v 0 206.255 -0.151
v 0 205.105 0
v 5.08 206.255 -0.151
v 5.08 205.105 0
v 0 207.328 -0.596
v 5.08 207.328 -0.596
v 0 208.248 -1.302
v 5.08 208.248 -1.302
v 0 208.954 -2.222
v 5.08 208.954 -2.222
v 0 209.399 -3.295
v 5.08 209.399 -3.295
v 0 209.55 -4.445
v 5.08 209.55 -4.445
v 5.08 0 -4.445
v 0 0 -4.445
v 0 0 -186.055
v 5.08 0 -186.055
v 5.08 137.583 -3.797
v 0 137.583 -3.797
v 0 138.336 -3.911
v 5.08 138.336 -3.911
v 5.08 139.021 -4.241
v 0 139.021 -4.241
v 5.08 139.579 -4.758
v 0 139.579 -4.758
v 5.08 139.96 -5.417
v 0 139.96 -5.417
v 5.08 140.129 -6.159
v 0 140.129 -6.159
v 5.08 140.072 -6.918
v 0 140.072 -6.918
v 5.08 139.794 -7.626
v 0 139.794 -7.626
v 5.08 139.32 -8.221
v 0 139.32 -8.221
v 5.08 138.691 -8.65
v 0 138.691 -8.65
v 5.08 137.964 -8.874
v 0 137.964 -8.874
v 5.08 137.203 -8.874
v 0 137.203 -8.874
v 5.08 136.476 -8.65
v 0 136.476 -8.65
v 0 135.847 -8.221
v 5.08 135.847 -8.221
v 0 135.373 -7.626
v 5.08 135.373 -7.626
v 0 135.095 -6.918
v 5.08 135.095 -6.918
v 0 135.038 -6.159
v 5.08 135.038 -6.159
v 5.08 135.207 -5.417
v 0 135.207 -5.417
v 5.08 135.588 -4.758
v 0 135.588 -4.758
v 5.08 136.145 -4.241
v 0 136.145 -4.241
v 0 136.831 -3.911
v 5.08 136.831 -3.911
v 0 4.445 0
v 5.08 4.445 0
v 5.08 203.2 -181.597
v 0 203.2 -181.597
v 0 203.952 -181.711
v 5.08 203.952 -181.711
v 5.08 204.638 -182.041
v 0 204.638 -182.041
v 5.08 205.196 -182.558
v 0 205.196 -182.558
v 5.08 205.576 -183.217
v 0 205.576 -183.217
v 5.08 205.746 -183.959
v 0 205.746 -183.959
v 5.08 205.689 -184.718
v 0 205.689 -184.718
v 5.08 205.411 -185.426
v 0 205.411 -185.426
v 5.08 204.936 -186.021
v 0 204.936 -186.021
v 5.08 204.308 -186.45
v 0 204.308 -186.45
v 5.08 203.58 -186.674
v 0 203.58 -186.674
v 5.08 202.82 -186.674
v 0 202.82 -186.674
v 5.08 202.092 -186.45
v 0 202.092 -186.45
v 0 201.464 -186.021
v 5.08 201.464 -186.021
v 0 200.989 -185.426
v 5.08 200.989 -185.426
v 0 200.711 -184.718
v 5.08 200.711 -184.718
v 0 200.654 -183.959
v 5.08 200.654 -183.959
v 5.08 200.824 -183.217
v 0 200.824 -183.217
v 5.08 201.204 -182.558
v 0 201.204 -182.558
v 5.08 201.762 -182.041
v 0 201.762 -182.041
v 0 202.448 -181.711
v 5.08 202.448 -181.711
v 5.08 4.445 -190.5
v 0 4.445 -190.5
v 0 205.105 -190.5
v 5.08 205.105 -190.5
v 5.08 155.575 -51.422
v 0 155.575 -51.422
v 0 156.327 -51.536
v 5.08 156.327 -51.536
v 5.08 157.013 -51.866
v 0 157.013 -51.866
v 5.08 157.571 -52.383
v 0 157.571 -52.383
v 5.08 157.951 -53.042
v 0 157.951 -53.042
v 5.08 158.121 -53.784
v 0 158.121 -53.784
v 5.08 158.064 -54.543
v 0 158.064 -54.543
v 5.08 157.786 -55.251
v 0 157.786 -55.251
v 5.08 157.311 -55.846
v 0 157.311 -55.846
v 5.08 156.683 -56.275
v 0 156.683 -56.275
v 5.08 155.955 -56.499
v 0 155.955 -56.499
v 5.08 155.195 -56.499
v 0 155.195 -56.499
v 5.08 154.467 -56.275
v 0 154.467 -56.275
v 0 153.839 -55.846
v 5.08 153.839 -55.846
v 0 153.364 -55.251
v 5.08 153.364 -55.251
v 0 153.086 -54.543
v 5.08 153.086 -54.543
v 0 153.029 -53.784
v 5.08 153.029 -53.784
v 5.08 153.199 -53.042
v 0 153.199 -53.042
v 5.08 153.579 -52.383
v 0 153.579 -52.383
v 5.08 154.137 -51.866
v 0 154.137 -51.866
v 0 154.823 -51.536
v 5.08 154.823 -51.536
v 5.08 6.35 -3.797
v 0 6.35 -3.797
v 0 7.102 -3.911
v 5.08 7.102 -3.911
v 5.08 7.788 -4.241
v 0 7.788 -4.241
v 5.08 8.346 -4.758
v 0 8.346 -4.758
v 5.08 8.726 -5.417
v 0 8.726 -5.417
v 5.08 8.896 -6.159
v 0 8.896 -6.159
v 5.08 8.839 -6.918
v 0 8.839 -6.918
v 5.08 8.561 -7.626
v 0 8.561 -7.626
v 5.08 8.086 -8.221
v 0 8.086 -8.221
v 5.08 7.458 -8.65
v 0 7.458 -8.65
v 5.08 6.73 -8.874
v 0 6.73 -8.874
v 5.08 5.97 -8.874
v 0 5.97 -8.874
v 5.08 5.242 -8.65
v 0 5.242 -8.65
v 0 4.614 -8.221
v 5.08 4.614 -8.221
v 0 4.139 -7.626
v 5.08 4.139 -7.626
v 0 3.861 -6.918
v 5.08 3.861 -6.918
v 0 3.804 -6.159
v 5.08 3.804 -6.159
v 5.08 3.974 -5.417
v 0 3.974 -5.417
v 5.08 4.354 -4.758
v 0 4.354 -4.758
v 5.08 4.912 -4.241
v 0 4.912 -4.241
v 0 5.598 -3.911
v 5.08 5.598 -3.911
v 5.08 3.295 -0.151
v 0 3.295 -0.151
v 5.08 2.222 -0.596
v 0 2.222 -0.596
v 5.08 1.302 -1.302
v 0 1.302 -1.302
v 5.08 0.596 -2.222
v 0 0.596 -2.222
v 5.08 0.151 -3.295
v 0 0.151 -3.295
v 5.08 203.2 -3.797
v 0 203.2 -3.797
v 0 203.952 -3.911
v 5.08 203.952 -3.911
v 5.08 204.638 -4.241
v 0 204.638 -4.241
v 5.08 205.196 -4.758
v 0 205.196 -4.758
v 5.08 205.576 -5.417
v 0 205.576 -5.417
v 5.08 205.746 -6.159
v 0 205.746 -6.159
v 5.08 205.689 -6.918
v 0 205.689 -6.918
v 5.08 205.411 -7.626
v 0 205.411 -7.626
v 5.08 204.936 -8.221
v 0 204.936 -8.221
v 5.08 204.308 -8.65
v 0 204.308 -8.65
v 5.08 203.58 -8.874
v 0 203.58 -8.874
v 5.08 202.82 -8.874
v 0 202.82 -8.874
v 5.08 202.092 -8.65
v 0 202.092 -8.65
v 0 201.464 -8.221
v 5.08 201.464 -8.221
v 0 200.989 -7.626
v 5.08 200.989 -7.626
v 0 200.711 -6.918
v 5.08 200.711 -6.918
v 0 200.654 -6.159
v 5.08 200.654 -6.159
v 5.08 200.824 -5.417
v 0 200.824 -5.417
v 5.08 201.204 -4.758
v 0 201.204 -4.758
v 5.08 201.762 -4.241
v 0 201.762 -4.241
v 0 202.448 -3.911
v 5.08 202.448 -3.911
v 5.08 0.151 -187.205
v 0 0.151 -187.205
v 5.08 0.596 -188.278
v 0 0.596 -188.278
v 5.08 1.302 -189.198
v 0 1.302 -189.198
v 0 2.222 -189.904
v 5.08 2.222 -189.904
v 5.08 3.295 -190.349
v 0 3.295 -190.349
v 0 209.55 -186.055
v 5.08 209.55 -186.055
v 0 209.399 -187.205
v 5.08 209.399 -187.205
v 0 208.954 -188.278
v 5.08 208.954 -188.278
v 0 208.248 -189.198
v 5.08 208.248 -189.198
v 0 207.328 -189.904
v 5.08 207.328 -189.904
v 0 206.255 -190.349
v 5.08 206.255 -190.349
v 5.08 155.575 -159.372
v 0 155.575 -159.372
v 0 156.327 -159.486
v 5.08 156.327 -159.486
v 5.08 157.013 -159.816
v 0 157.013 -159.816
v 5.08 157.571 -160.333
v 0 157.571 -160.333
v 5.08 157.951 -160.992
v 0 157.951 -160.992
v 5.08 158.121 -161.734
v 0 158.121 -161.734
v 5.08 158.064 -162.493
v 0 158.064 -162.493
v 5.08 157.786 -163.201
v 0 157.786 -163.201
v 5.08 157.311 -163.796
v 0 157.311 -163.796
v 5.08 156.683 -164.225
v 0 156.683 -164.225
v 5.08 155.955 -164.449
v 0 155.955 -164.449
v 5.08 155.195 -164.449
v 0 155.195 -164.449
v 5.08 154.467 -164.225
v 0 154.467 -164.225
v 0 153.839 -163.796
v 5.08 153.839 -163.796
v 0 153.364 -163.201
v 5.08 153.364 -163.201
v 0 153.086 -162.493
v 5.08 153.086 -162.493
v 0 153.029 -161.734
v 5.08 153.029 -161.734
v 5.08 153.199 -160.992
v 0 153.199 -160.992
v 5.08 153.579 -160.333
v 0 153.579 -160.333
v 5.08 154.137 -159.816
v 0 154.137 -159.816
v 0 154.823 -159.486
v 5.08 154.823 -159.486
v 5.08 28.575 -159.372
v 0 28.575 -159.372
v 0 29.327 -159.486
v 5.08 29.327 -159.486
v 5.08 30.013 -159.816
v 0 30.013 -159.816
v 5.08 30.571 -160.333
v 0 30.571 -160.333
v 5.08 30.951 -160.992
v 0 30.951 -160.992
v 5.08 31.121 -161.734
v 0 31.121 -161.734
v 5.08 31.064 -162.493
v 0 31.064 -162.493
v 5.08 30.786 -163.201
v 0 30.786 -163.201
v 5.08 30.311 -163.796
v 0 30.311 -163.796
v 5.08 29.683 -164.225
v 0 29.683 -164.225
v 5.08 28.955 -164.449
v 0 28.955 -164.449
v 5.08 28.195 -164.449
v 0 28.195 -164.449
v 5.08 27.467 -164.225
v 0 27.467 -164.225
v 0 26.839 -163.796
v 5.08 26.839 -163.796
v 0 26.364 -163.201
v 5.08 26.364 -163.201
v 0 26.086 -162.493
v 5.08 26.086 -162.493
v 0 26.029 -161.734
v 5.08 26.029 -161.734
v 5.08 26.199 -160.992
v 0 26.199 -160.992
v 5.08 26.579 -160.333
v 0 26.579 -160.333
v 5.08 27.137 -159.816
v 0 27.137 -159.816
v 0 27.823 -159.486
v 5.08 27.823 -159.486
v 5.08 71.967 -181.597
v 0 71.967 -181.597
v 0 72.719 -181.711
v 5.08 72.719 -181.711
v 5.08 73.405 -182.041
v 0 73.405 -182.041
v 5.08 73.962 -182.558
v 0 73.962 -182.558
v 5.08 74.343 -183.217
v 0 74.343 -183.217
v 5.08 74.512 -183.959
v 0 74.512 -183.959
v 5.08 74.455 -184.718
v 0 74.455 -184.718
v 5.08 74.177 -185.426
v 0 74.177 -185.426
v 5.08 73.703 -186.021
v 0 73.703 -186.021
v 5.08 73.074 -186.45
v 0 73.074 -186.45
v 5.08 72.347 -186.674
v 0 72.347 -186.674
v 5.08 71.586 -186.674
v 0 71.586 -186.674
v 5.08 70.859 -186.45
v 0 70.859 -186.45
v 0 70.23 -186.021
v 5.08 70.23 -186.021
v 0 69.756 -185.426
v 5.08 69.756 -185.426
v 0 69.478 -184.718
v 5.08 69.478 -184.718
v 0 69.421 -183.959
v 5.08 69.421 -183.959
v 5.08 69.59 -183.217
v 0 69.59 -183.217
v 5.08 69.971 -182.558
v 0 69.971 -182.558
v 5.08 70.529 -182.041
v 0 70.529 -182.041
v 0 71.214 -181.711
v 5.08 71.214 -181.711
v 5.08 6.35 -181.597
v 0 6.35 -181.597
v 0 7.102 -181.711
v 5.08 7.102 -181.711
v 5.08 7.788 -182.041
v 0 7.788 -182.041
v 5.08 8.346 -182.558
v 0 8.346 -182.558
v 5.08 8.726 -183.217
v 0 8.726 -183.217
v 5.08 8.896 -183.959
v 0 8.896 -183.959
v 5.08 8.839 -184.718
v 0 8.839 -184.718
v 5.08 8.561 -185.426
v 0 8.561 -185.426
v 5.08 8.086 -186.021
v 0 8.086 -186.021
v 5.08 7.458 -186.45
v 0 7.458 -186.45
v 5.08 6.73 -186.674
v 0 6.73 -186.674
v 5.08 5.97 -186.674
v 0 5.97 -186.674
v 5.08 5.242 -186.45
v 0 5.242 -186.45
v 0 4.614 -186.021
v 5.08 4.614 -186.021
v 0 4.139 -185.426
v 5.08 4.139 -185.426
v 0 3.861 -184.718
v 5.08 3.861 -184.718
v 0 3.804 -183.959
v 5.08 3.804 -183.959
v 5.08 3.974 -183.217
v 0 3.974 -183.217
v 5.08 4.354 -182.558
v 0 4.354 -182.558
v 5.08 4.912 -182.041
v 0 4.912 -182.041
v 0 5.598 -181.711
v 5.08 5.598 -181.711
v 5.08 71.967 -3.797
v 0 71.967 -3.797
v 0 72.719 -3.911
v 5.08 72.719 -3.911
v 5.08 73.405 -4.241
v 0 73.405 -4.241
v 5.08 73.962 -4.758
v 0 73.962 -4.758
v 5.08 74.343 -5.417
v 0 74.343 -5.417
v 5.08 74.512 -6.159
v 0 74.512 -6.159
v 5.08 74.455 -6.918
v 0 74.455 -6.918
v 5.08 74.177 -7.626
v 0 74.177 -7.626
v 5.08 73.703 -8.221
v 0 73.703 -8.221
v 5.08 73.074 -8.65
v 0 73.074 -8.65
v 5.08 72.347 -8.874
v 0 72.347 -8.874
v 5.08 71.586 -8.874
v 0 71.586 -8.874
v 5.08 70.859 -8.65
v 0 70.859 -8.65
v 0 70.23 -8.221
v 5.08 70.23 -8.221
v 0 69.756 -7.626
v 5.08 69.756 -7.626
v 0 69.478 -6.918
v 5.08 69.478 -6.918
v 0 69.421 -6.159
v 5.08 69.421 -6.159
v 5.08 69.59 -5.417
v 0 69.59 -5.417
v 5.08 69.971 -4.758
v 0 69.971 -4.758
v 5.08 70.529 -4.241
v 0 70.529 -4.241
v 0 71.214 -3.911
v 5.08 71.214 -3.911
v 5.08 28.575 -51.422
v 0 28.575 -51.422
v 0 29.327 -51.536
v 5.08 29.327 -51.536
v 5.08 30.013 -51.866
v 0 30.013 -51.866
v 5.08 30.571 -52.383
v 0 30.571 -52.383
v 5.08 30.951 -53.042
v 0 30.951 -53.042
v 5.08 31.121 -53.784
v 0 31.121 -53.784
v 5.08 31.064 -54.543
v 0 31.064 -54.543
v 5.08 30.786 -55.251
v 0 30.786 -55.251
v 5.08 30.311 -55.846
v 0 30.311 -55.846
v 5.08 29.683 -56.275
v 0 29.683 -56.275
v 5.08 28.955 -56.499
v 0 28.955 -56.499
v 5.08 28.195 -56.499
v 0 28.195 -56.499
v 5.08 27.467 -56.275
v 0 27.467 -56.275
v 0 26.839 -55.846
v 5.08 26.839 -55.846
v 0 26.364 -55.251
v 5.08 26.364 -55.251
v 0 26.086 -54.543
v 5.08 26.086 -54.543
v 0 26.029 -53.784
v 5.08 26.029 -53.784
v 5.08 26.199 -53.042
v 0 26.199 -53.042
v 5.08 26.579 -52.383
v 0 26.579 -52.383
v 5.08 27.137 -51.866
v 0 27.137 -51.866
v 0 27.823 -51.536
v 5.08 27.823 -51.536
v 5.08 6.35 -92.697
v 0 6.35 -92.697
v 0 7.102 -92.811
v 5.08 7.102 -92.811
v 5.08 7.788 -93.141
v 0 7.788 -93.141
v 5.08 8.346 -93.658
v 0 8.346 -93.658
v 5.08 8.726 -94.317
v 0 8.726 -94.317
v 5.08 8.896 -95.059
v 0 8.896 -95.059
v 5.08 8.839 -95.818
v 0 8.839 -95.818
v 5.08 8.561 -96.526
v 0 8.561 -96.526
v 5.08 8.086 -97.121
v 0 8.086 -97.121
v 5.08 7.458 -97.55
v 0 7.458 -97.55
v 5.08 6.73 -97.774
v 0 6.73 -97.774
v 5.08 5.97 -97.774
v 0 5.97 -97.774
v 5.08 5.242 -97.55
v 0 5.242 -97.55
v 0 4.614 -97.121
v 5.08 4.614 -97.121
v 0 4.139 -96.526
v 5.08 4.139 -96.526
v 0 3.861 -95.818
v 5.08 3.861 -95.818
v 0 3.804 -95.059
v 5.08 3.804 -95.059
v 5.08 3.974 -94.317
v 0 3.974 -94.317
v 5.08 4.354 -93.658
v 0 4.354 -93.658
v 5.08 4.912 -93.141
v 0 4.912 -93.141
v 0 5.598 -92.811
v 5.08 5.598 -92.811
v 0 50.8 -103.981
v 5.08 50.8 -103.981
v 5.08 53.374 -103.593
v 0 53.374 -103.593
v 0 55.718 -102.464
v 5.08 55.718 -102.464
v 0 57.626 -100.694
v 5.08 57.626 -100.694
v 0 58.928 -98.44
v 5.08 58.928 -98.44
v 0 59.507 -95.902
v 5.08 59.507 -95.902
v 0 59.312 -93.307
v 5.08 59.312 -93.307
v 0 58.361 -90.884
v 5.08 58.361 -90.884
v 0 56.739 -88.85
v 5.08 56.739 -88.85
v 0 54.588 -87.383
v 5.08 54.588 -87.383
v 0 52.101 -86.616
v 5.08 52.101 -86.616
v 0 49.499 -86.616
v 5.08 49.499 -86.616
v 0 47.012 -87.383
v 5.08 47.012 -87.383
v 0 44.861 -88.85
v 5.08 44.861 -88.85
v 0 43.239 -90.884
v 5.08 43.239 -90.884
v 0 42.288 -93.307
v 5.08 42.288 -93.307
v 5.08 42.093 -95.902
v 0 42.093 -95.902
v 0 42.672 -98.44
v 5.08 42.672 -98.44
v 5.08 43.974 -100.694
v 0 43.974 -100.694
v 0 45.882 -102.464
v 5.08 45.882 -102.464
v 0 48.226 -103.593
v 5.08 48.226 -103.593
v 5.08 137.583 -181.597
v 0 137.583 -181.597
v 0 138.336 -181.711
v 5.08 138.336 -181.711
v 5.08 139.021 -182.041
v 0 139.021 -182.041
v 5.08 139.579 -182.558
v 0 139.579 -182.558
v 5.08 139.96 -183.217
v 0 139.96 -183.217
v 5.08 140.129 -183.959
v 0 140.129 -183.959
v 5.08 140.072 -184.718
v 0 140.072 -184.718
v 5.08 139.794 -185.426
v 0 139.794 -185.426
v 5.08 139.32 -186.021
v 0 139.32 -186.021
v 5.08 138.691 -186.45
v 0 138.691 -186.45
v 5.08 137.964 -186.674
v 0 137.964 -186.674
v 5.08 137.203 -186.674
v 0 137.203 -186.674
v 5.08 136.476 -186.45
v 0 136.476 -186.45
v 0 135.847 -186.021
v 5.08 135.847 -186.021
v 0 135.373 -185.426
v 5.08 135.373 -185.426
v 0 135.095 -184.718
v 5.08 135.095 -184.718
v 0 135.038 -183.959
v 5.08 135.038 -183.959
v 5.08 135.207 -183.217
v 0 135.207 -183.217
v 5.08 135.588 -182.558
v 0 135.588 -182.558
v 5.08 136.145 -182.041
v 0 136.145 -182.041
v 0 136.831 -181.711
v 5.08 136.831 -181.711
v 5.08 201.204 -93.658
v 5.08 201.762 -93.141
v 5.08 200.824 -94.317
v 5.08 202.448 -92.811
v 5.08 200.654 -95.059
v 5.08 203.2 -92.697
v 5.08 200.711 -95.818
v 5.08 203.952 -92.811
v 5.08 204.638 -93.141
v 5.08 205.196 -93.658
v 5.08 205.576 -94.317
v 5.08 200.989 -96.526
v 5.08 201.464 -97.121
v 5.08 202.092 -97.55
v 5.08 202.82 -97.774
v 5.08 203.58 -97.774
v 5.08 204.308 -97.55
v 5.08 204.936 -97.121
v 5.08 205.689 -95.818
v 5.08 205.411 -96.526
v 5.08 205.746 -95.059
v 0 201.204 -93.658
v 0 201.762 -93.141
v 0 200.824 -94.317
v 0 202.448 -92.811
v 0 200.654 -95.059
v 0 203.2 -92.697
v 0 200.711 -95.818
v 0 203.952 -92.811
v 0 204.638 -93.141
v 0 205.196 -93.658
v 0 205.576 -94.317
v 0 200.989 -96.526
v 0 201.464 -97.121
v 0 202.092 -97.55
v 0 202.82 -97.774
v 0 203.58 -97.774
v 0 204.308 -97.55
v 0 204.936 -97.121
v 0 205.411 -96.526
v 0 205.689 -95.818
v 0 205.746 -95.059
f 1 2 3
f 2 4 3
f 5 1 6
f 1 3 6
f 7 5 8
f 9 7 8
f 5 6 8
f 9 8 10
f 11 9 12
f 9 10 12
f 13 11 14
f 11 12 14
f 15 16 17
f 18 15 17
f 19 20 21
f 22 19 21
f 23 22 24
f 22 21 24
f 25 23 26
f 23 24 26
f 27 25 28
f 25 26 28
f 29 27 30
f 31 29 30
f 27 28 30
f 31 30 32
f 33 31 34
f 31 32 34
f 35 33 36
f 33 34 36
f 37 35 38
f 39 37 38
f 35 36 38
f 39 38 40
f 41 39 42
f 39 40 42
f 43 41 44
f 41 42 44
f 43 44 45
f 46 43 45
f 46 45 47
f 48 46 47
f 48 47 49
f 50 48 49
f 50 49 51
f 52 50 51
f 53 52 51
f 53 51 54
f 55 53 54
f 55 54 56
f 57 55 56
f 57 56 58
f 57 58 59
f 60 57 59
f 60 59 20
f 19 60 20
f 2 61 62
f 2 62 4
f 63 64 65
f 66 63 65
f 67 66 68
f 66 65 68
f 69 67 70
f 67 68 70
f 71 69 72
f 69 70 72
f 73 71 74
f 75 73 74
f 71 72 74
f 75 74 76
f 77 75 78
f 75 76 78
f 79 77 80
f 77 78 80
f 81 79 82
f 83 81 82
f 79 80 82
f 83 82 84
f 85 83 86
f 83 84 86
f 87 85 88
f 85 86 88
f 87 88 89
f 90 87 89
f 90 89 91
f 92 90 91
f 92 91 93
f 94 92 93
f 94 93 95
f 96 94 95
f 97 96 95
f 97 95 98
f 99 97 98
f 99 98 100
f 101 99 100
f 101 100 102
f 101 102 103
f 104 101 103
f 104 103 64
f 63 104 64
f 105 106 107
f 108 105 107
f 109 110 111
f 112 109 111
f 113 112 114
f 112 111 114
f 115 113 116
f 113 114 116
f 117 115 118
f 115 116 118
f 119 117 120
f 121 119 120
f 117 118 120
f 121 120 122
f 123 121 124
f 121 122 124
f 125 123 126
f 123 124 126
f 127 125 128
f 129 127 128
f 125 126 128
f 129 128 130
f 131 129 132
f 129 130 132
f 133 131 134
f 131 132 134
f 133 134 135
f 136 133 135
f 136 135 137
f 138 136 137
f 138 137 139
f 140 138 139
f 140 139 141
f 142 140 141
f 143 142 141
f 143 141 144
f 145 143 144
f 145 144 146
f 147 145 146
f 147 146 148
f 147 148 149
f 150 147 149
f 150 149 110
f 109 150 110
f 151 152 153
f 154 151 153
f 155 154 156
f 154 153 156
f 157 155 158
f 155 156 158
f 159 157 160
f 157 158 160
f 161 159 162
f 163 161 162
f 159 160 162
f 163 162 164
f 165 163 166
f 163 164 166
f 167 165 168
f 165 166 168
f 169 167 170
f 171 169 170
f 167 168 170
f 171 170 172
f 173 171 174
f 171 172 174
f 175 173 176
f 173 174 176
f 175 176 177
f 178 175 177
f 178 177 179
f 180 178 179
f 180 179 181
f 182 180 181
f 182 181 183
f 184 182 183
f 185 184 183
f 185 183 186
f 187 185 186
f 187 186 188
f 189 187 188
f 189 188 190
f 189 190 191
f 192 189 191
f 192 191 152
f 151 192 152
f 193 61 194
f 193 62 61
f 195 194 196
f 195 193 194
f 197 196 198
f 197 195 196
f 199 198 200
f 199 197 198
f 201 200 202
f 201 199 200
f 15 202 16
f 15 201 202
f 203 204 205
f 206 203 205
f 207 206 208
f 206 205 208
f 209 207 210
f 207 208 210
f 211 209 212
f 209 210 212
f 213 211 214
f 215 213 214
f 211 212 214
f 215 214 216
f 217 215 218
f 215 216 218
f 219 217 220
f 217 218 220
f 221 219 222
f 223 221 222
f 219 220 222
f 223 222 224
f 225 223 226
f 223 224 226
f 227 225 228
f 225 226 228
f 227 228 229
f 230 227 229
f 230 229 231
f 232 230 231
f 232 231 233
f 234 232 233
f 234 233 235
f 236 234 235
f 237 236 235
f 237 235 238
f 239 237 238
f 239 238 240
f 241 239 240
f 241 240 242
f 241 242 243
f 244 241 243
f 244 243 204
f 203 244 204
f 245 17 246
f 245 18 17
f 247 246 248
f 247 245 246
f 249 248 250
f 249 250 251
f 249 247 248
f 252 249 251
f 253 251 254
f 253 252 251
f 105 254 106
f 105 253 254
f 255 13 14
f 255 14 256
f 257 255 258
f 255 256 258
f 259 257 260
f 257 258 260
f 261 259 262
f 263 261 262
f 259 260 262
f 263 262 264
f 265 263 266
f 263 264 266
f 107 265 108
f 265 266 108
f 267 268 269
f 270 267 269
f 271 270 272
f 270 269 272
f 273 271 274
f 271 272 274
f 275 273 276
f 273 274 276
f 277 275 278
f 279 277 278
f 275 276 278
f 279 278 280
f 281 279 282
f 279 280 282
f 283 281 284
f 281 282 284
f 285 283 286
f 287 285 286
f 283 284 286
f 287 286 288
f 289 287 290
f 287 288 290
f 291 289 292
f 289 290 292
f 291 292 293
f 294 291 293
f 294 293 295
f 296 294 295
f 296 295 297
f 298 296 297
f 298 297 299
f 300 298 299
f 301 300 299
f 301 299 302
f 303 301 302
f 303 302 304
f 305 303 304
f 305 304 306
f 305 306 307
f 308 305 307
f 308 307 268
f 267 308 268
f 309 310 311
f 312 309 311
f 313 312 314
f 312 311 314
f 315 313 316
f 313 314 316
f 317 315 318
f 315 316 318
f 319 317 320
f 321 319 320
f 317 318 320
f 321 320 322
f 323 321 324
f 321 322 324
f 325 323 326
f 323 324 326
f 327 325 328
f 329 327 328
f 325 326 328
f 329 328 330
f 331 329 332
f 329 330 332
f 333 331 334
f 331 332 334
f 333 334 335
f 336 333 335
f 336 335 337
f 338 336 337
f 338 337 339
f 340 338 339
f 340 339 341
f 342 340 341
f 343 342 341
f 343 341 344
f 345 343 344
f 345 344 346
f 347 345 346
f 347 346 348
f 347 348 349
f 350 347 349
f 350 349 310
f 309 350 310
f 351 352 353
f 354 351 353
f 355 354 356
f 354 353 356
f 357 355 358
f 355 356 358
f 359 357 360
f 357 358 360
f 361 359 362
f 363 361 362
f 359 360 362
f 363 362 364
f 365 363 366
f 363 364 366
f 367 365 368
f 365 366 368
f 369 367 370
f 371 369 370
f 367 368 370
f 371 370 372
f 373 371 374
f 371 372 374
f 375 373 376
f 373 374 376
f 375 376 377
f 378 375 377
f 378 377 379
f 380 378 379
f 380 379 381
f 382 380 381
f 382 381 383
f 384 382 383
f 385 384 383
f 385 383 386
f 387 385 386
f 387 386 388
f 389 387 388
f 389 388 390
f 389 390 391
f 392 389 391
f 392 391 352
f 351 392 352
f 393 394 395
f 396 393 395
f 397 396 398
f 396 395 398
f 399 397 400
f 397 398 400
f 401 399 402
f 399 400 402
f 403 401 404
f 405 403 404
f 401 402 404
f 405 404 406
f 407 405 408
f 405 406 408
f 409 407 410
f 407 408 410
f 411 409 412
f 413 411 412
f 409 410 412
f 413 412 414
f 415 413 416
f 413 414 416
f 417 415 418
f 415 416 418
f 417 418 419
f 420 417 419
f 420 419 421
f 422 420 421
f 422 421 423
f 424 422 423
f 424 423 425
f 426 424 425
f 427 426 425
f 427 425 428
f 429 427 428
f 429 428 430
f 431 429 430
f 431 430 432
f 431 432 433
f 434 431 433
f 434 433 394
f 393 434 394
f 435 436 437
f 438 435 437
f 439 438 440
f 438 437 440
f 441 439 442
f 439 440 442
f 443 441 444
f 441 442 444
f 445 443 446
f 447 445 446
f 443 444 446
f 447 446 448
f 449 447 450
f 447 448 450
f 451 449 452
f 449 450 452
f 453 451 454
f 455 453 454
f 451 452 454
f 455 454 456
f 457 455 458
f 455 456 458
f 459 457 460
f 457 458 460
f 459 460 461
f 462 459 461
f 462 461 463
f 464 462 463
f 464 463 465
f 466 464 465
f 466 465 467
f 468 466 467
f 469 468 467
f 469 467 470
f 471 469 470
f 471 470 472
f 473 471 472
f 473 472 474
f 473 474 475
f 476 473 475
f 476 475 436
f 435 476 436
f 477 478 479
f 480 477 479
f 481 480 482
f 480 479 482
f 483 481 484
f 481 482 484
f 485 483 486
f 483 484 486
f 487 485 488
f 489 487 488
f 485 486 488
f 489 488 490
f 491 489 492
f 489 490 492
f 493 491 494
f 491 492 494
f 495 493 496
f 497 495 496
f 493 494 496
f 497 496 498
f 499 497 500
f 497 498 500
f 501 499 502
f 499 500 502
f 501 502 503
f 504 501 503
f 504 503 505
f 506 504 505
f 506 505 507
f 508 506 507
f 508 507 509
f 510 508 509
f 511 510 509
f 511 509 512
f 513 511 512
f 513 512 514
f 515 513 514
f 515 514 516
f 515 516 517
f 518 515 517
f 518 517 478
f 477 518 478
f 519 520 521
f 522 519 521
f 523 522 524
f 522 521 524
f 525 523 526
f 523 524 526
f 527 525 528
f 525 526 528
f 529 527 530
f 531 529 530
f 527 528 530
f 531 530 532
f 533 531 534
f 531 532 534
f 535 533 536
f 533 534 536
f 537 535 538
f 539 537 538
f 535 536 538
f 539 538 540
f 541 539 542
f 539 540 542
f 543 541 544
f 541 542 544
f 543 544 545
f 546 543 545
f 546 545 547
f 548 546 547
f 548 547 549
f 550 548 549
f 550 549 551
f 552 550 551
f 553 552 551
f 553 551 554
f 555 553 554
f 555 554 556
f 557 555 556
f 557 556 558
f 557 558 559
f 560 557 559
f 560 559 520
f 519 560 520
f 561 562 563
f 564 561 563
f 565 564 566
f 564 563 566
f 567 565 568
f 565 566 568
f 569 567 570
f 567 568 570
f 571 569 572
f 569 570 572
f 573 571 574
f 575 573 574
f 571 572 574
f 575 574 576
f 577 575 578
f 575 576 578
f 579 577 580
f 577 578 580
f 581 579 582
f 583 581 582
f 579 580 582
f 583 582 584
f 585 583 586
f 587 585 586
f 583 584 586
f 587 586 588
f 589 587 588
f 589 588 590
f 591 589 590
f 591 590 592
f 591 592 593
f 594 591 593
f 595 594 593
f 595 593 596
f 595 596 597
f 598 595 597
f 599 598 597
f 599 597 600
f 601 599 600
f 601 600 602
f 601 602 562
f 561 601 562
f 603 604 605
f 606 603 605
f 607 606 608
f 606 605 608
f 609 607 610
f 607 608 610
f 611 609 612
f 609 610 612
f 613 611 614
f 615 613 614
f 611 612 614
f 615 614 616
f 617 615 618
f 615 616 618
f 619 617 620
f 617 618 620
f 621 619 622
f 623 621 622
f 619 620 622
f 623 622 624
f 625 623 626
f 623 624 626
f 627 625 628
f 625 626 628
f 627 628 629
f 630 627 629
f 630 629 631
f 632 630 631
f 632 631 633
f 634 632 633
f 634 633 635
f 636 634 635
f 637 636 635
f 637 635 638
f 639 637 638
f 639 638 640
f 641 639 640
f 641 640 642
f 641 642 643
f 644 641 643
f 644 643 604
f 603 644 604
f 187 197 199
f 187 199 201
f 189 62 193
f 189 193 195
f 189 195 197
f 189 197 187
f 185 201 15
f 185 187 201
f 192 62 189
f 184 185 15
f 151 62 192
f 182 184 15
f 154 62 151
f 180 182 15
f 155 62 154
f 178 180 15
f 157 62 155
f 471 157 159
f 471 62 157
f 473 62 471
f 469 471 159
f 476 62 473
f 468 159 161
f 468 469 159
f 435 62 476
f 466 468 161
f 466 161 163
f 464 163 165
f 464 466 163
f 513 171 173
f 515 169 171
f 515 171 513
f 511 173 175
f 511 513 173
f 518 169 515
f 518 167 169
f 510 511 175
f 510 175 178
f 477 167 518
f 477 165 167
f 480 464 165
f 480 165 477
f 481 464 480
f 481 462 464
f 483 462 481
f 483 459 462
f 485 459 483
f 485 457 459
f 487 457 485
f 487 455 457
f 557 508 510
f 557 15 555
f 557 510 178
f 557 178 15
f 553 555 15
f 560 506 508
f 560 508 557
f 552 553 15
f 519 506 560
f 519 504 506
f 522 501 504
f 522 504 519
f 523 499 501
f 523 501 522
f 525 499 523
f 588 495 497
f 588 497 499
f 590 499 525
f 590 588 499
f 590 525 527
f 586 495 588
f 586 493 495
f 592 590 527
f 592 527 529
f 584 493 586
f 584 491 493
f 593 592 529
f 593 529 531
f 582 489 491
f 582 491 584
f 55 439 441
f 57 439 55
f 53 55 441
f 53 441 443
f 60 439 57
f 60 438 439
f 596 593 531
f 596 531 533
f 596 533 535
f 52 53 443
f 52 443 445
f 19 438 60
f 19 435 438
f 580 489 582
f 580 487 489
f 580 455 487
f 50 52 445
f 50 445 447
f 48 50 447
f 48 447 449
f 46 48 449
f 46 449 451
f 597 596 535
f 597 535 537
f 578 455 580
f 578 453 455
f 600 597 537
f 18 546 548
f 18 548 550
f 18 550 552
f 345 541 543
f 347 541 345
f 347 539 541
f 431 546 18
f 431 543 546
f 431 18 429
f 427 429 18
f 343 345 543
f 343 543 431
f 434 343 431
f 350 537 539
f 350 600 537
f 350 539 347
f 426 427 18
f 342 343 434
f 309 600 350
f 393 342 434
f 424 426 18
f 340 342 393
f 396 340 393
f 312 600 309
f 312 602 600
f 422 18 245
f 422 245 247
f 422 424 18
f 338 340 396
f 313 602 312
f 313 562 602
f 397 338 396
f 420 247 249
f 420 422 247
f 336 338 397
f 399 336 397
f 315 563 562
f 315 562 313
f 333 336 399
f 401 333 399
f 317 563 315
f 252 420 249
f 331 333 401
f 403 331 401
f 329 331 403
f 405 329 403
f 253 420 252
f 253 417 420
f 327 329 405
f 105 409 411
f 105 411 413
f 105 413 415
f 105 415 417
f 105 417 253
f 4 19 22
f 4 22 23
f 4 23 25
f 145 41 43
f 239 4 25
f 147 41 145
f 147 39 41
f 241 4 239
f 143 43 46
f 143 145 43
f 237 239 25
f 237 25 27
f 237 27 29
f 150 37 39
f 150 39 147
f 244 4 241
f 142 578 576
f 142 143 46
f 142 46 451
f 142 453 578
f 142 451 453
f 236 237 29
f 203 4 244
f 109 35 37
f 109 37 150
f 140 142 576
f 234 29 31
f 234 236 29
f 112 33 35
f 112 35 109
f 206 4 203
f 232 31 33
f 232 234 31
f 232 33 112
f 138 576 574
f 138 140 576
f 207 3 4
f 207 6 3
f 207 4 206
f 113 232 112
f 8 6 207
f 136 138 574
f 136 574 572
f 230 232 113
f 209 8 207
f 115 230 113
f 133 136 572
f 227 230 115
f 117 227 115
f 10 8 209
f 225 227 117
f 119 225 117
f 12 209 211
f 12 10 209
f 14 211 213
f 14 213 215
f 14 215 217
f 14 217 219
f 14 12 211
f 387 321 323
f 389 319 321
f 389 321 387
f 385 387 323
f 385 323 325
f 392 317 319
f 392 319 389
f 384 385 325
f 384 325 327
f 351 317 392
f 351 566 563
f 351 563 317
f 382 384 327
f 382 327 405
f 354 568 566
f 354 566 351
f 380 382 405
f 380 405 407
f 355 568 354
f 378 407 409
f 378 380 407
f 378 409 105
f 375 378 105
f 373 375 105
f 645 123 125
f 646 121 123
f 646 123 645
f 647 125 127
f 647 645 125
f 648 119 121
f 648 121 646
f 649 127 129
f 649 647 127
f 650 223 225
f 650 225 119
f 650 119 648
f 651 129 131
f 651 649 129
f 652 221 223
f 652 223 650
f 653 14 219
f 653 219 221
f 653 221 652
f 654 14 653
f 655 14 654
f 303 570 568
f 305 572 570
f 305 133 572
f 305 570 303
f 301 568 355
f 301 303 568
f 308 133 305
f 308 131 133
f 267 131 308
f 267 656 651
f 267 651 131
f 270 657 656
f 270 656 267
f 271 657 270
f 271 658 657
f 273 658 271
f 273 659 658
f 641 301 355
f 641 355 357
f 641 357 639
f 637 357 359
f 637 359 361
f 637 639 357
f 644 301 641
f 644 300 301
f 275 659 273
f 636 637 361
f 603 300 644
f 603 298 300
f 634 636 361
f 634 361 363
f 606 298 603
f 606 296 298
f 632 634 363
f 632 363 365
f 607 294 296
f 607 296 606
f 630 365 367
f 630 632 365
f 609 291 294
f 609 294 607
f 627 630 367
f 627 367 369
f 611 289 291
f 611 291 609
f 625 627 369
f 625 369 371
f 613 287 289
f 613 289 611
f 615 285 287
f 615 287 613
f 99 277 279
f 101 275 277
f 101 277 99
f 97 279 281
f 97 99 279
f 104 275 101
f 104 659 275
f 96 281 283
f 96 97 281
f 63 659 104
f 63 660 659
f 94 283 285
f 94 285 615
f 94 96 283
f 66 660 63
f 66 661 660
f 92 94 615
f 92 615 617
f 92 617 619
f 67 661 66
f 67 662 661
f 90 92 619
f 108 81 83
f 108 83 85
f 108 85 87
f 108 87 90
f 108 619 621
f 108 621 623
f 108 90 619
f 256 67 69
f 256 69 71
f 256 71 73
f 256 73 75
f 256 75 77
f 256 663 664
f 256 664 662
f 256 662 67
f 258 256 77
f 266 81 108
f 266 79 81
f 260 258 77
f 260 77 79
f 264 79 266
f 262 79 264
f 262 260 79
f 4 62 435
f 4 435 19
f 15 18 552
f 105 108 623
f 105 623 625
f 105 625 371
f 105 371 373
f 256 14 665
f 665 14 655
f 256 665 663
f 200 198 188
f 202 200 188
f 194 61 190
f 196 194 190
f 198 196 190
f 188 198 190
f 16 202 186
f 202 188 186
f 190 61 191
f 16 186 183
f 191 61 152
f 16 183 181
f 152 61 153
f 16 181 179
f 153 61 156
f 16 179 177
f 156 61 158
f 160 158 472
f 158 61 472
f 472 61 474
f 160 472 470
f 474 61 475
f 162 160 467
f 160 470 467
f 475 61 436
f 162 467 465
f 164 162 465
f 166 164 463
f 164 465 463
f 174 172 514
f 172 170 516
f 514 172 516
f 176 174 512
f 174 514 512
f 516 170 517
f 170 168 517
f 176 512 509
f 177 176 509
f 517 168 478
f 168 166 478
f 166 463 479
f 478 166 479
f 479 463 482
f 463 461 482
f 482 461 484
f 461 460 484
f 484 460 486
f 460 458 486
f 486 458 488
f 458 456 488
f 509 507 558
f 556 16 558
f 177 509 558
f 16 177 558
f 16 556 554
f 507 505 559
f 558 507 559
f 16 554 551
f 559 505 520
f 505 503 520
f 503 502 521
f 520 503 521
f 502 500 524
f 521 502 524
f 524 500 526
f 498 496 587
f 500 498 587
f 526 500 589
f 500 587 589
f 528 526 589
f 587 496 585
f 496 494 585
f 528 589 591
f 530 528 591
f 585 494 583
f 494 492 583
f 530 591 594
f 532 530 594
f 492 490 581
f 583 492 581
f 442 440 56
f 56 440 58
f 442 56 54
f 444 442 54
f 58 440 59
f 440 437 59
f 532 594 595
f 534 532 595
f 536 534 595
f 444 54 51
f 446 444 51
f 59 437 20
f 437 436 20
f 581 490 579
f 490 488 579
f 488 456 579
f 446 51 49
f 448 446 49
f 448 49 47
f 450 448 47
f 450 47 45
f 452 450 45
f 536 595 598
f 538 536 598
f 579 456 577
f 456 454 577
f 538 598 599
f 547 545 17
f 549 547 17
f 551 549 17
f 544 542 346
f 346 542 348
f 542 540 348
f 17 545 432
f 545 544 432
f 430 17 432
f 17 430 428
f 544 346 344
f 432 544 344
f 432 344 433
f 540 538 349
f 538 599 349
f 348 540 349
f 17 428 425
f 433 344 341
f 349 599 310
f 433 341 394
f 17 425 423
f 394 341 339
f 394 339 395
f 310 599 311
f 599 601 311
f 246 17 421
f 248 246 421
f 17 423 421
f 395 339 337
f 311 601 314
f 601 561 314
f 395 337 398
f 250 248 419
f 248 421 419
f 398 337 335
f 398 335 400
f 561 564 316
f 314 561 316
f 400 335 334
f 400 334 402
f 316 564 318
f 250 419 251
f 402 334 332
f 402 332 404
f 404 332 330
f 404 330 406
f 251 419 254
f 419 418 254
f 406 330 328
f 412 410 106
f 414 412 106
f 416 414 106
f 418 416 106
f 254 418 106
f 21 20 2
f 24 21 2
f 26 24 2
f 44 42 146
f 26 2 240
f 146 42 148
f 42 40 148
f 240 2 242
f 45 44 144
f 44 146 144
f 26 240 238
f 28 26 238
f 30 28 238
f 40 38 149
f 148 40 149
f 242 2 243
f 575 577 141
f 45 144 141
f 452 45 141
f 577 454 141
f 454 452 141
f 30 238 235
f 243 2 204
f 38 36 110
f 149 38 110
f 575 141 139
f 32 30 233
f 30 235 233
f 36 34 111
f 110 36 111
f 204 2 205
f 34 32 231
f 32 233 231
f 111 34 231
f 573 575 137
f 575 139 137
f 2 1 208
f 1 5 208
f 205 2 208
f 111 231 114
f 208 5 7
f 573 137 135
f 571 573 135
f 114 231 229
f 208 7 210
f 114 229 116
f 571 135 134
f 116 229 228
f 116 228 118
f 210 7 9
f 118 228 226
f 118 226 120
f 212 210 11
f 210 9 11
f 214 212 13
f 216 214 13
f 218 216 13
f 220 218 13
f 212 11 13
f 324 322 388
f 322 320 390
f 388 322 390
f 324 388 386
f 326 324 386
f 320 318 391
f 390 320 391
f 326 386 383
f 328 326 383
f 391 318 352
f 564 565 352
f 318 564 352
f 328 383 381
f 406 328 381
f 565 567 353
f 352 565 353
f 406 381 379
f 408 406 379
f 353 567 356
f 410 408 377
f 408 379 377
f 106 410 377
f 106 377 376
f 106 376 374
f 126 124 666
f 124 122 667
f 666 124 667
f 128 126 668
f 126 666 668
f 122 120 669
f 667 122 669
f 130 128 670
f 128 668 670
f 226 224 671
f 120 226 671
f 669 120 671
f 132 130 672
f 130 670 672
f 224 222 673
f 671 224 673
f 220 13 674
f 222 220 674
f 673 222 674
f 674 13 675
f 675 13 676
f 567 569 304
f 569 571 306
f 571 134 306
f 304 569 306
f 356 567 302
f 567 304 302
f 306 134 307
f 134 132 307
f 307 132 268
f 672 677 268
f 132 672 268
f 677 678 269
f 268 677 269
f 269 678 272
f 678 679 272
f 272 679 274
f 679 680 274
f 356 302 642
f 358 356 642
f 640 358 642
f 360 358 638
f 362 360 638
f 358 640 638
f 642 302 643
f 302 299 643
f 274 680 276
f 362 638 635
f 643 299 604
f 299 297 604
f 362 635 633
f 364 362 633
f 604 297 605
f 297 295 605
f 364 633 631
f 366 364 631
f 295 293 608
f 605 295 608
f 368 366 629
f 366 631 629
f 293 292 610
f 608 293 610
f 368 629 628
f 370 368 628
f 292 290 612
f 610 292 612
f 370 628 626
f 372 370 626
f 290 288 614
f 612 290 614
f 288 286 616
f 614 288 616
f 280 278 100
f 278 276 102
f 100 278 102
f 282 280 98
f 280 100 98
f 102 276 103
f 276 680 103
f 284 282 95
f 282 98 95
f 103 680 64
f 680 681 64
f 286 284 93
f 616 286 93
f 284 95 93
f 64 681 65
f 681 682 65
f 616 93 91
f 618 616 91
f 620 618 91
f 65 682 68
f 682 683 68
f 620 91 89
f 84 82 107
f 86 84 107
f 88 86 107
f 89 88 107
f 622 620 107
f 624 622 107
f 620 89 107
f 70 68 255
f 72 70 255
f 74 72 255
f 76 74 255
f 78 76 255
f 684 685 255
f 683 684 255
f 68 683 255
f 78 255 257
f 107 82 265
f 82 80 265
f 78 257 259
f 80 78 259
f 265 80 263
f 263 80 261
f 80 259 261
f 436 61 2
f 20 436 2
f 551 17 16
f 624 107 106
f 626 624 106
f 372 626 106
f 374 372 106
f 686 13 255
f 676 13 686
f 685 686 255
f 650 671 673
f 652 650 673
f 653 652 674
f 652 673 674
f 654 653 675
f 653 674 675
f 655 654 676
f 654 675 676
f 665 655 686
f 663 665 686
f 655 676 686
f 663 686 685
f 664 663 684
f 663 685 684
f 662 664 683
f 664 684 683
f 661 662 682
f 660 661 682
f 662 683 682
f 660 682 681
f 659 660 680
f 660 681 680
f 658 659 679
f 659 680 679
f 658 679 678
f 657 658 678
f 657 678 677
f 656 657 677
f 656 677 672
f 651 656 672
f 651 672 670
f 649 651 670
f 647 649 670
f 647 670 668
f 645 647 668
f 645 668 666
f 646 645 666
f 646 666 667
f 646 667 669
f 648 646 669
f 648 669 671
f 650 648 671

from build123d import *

# Parameters (mm, degrees)
SKETCH1_W              = 190.5
SKETCH1_H              = 209.55
BOSS_EXTRUDE2_DEPTH    = 5.08
SKETCH2_R              = 8.73125
CUT_EXTRUDE1_DEPTH     = 6.08
F_10_CLEARANCE_HOLE2_D = 5.1054
FILLET1_R              = 4.445
F_10_CLEARANCE_HOLE1_D = 5.1054


with BuildPart() as part:
    # Sketch1 → Boss-Extrude2 (new body)
    with BuildSketch(Plane(origin=(0, 0, 0), x_dir=(0, 0, -1), z_dir=(1, 0, 0))):
        with Locations((95.25, 104.775)):
            Rectangle(SKETCH1_W, SKETCH1_H)
    extrude(amount=BOSS_EXTRUDE2_DEPTH)

    # Sketch2 → Cut-Extrude1 (cut, through all)
    with BuildSketch(Plane(origin=(5.08, 0, 0), x_dir=(0, 0, -1), z_dir=(1, 0, 0))):
        with Locations((95.25, 50.8)):
            Circle(SKETCH2_R)
    extrude(amount=-CUT_EXTRUDE1_DEPTH, mode=Mode.SUBTRACT)

    # #10 Clearance Hole2 (through all)
    with Locations(Plane(origin=(5.08, 0, 0), x_dir=(0, 0, -1), z_dir=(1, 0, 0))):
        with Locations((53.975, 28.575), (53.975, 155.575), (161.925, 155.575), (161.925, 28.575)):
            Hole(F_10_CLEARANCE_HOLE2_D / 2)

    # Fillet1
    fillet1_edges = [part.edges().sort_by_distance(p)[0] for p in [
        (2.54, 209.55, 0),
        (2.54, 209.55, -190.5),
        (2.54, 0, -190.5),
        (2.54, 0, 0),
    ]]
    fillet(fillet1_edges, radius=FILLET1_R)

    # #10 Clearance Hole1 (through all)
    with Locations(Plane(origin=(5.08, 0, 0), x_dir=(0, 0, -1), z_dir=(1, 0, 0))):
        with Locations((6.35, 203.2), (184.15, 6.35), (6.35, 6.35), (184.15, 203.2), (95.25, 6.35), (95.25, 203.2), (6.35, 137.583333333), (6.35, 71.966666667), (184.15, 71.966666667), (184.15, 137.583333333)):
            Hole(F_10_CLEARANCE_HOLE1_D / 2)


solid = part.part
